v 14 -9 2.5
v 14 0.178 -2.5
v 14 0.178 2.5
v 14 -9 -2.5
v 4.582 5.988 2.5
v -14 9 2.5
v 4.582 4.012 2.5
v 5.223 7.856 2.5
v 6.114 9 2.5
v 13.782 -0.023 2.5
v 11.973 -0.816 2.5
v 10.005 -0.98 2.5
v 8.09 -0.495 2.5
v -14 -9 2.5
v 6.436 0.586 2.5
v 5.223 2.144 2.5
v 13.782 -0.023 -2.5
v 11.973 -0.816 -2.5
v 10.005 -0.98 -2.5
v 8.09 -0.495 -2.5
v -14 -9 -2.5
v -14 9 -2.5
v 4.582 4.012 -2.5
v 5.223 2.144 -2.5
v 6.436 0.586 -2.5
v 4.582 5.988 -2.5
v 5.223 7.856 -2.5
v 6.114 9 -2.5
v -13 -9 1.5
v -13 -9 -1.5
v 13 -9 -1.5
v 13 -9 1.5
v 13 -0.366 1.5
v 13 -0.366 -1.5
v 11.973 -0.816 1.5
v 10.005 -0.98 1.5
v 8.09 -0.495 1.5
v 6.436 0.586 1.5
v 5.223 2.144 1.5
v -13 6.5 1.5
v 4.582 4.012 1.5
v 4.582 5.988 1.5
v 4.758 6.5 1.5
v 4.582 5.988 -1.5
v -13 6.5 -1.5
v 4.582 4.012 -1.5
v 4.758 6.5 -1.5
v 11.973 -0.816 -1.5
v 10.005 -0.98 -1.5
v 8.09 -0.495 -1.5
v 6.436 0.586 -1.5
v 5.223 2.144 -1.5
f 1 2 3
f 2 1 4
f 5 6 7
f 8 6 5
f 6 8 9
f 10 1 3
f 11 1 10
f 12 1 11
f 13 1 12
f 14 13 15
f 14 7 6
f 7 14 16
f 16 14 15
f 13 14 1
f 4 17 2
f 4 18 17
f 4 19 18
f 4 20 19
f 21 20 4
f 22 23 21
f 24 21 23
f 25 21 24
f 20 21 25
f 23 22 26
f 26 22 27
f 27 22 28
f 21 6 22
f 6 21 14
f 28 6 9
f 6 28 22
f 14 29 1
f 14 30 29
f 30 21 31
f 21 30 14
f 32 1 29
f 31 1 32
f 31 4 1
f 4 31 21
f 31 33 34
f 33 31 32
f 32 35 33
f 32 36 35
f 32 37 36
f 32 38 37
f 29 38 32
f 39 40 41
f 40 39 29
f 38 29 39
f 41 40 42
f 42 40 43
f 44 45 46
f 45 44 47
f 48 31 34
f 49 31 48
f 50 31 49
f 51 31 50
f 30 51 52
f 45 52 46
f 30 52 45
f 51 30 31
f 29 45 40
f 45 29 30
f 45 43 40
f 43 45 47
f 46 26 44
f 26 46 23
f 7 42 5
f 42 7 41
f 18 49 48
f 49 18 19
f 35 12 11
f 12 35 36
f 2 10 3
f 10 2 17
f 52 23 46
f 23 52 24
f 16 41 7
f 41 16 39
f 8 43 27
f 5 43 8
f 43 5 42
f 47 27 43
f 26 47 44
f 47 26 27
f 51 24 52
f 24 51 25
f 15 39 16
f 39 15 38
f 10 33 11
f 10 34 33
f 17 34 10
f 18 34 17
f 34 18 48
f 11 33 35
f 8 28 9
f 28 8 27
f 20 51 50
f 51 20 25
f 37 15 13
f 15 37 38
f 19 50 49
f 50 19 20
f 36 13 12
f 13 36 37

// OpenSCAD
//difference(){
WIDTH=26;
difference(){
	color("green")cube([WIDTH+2,18,5], center=true);
   translate([0,-6,0])
	cube([WIDTH,25,3], center=true);
//   translate([WIDTH/2 - 2,0,0])
//   cube([4,25,3], center=true);
   translate([WIDTH/2 - 2.5,5,0])
   //cube([9,10,5], center=true);
    cylinder(r=6,h=10,center=true);
}
//translate([0,0,50]);
//cube([100,100,100], center=true);}
